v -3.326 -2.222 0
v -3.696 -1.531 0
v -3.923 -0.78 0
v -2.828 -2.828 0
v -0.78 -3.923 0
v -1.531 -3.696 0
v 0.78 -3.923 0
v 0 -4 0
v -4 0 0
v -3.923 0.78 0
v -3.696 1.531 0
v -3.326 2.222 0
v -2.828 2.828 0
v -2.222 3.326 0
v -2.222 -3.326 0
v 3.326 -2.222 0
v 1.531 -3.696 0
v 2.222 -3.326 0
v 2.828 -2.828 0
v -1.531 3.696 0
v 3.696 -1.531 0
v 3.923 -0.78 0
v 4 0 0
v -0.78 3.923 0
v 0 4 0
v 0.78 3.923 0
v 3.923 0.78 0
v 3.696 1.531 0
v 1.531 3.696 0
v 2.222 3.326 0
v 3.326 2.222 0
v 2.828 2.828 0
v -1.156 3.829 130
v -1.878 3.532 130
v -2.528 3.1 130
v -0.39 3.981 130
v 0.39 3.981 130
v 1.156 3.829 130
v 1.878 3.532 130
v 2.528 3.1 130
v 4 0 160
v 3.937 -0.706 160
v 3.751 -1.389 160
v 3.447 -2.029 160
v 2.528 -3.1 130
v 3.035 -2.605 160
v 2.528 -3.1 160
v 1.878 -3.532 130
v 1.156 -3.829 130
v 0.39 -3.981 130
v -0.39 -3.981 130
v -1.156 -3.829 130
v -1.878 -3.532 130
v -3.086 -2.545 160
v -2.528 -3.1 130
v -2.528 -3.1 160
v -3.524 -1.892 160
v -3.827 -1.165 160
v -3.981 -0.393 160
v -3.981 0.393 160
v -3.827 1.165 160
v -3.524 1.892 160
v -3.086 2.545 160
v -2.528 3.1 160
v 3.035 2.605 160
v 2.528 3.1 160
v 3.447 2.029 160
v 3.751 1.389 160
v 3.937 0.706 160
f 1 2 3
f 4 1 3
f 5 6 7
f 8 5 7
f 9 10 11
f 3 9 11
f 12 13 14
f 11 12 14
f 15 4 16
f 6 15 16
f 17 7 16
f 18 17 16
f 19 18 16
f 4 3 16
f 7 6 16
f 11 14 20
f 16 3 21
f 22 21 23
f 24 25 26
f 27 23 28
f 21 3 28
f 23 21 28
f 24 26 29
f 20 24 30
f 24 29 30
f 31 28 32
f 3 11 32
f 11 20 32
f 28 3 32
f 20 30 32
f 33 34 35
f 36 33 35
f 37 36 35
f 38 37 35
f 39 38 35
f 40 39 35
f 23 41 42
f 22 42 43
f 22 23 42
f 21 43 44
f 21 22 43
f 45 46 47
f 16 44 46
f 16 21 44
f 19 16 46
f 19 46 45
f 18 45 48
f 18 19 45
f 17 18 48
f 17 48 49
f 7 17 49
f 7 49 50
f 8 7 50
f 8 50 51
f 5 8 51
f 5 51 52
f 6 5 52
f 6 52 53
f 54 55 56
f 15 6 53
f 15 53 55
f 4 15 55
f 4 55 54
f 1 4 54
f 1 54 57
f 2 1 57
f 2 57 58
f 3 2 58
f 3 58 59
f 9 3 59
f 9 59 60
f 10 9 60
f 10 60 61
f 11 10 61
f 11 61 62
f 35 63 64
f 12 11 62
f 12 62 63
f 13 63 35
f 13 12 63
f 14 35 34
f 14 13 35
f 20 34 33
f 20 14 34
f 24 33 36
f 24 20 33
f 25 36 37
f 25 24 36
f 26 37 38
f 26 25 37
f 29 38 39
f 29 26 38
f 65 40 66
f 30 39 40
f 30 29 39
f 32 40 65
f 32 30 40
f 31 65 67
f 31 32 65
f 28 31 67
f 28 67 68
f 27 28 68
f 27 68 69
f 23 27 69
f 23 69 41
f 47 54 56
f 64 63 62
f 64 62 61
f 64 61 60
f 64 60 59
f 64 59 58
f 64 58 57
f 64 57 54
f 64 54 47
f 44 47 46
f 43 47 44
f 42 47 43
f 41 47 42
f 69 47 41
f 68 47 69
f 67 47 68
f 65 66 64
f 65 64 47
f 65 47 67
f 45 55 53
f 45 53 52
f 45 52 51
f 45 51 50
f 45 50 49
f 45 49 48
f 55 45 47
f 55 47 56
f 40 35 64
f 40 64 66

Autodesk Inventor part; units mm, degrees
ref_plane "YZ Plane" through (0, 0, 0) normal (1, 0, 0) x (0, 1, 0)
ref_plane "XZ Plane" through (0, 0, 0) normal (0, 1, 0) x (-1, 0, 0)
ref_plane "XY Plane" through (0, 0, 0) normal (0, 0, 1) x (1, 0, 0)
sketch "Sketch1" plane through (0, 0, 0) normal (0, 0, 1) x (1, 0, 0)
  circle A0 centre (0, 0) radius 4
  dimension "d0" = 8
extrude "Extrusion1" add sketch "Sketch1" along normal blind 160
sketch "Sketch2" plane through (0, 0, 160) normal (0, 0, 1) x (1, 0, 0)
  line L0 (-2.5278, 3.1) -> (2.5278, 3.1)
  line L1 (2.5278, -3.1) -> (-2.5278, -3.1)
  arc A0 (-2.5278, 3.1) -> (-2.5278, -3.1) centre (0, 0) ccw
  arc A1 (2.5278, -3.1) -> (2.5278, 3.1) centre (0, 0) ccw
  line L2 (-2.5278, 3.1) -> (3.1486, 3.1)
  line L3 (3.1486, 3.1) -> (3.1486, 5.5336)
  line L4 (3.1486, 5.5336) -> (-2.5278, 5.5336)
  line L5 (-2.5278, 5.5336) -> (-2.5278, 3.1)
  line L6 (2.5278, -3.1) -> (-2.7681, -3.1)
  line L7 (-2.7681, -3.1) -> (-2.7681, -5.0994)
  line L8 (-2.7681, -5.0994) -> (2.5278, -5.0994)
  line L9 (2.5278, -5.0994) -> (2.5278, -3.1)
  dimension "d3" = 3.1
extrude "Extrusion2" cut sketch "Sketch2" against normal blind 30 contours L5 L4 L3 L2 L0 | L1 L9 L8 L7 L6
properties part number "oś napędowa"
